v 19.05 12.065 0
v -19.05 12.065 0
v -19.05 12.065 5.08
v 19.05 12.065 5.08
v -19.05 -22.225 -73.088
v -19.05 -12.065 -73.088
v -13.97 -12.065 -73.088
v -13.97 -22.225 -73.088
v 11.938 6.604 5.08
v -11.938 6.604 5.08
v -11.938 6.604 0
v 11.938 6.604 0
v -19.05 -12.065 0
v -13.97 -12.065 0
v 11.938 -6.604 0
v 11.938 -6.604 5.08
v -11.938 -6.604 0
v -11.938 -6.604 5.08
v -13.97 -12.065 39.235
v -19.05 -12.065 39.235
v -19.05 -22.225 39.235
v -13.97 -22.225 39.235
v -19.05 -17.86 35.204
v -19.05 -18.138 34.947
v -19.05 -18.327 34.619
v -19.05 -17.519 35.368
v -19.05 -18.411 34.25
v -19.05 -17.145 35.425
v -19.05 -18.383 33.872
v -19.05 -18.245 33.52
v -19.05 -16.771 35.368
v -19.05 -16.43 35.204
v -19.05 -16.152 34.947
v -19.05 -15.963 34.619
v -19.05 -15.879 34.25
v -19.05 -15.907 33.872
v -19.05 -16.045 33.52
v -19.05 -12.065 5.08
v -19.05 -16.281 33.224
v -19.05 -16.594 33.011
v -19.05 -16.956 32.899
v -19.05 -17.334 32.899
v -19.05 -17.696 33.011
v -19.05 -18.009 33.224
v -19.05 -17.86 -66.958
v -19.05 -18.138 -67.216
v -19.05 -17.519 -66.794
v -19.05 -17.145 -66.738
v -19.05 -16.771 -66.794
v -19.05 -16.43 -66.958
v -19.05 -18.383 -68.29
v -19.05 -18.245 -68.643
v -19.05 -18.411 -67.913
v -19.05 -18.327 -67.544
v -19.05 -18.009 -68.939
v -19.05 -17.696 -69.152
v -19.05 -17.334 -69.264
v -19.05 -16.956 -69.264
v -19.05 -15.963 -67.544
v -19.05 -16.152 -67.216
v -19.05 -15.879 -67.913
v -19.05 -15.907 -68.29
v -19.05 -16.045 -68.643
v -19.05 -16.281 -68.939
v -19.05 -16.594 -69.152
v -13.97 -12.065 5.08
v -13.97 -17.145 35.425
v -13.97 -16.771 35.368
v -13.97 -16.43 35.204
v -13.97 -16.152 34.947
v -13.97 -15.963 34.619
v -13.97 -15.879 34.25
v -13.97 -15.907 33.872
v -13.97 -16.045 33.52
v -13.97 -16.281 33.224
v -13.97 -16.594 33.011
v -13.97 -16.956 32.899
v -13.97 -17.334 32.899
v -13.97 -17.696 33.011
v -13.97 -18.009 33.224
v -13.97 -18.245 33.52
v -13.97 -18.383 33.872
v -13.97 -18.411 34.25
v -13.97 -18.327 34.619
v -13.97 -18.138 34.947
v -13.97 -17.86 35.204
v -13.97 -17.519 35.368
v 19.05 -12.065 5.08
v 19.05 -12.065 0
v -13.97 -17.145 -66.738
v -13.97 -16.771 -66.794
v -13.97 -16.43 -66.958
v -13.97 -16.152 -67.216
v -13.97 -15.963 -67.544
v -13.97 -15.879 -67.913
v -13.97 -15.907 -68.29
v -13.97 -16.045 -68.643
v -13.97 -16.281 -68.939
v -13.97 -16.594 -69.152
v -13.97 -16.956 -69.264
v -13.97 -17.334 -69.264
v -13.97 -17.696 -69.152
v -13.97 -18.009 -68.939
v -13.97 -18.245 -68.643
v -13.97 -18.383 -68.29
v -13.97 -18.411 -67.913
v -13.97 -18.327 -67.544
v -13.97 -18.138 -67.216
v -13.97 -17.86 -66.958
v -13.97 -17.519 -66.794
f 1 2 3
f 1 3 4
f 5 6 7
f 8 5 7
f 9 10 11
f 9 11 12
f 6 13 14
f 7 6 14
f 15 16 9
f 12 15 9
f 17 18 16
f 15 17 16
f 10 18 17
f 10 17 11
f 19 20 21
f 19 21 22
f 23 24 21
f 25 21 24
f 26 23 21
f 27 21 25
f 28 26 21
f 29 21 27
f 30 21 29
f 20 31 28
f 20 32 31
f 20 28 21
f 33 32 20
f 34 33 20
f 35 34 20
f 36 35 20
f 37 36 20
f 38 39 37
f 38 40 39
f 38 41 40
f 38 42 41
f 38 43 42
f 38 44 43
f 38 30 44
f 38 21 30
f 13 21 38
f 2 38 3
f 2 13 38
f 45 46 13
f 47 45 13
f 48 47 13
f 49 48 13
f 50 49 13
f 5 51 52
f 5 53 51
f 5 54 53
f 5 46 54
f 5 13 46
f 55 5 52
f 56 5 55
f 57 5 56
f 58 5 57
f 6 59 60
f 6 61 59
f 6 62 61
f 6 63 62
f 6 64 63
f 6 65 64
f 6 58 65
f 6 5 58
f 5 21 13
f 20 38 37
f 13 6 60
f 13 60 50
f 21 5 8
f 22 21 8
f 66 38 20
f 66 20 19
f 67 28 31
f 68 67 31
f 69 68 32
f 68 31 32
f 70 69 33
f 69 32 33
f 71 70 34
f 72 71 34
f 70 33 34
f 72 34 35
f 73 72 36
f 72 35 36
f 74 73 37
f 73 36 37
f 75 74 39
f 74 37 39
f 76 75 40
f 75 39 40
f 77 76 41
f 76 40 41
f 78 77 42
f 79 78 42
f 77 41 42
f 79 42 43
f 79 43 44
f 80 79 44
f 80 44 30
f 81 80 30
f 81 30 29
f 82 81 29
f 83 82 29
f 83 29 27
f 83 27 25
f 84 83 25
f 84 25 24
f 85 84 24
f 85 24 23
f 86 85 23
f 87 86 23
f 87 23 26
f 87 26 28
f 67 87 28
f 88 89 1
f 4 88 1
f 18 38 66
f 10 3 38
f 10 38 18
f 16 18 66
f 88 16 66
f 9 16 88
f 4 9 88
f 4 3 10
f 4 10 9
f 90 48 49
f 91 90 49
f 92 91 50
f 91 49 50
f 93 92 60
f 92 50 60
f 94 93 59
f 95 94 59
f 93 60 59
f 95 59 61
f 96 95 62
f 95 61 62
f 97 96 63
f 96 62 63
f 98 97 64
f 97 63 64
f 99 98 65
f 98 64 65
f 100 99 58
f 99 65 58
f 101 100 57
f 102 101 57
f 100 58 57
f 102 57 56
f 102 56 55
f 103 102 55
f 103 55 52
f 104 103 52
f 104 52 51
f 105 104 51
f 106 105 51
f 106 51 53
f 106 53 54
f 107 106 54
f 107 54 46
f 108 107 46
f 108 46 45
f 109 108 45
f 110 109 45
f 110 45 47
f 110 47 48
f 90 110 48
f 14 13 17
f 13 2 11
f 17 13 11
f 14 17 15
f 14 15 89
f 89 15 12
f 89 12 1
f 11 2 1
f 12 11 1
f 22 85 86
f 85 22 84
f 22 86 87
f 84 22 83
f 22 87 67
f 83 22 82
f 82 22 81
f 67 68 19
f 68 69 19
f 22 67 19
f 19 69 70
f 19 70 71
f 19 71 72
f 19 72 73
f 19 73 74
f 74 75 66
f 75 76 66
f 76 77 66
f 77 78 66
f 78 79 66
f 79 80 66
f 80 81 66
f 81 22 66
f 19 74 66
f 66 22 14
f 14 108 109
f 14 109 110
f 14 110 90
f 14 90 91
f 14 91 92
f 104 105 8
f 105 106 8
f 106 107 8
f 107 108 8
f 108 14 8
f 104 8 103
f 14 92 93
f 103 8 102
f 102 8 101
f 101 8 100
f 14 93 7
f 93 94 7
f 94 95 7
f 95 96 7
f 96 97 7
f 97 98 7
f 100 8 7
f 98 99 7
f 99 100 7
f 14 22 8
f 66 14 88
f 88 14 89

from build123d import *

# Parameters (mm, degrees)
SKETCH2_W                = 38.1
SKETCH2_H                = 24.13
BOSS_EXTRUDE1_DEPTH      = 5.08
SKETCH3_W                = 23.876
SKETCH3_H                = 13.208
CUT_EXTRUDE1_DEPTH       = 5.08
BOSS_EXTRUDE2_DEPTH      = 34.154802
BOSS_EXTRUDE2_DEPTH_BACK = 78.16772
SKETCH4_W                = 5.08
SKETCH4_H                = 10.16
CUT_EXTRUDE2_REACH       = 87.366
SKETCH5_R                = 1.27


with BuildPart() as part:
    # Sketch2 → Boss-Extrude1 (new body)
    with BuildSketch(Plane.XY):
        Rectangle(SKETCH2_W, SKETCH2_H)
    extrude(amount=BOSS_EXTRUDE1_DEPTH)

    # Sketch3 → Cut-Extrude1 (cut)
    with BuildSketch(Plane.XY.offset(5.08)):
        Rectangle(SKETCH3_W, SKETCH3_H)
    extrude(amount=-CUT_EXTRUDE1_DEPTH, mode=Mode.SUBTRACT)

    # Sketch4 → Boss-Extrude2 (add, two sides: drawn at the far end of the back side and taken through both)
    with BuildSketch(Plane.XY.offset(5.08).offset(-BOSS_EXTRUDE2_DEPTH_BACK)):
        with Locations((-16.51, -17.145)):
            Rectangle(SKETCH4_W, SKETCH4_H)
    extrude(amount=BOSS_EXTRUDE2_DEPTH + BOSS_EXTRUDE2_DEPTH_BACK)

    # Sketch5 → Cut-Extrude2 (cut, up to next)
    with BuildSketch(Plane.ZY.offset(19.05), mode=Mode.PRIVATE) as cut_extrude2_sk1:
        with Locations((-68.007719547, -17.145)):
            Circle(SKETCH5_R)
    cut_extrude2_tool1 = extrude(cut_extrude2_sk1.sketch, amount=-CUT_EXTRUDE2_REACH, mode=Mode.PRIVATE) & part.part
    # Sketch5 → Cut-Extrude2 (cut, up to next)
    with BuildSketch(Plane.ZY.offset(19.05), mode=Mode.PRIVATE) as cut_extrude2_sk2:
        with Locations((34.154802315, -17.145)):
            Circle(SKETCH5_R)
    cut_extrude2_tool2 = extrude(cut_extrude2_sk2.sketch, amount=-CUT_EXTRUDE2_REACH, mode=Mode.PRIVATE) & part.part
    add(cut_extrude2_tool1.solids().sort_by_distance((-19.05, -17.145, -68.00772))[0], mode=Mode.SUBTRACT)
    add(cut_extrude2_tool2.solids().sort_by_distance((-19.05, -17.145, 34.154802))[0], mode=Mode.SUBTRACT)


solid = part.part
